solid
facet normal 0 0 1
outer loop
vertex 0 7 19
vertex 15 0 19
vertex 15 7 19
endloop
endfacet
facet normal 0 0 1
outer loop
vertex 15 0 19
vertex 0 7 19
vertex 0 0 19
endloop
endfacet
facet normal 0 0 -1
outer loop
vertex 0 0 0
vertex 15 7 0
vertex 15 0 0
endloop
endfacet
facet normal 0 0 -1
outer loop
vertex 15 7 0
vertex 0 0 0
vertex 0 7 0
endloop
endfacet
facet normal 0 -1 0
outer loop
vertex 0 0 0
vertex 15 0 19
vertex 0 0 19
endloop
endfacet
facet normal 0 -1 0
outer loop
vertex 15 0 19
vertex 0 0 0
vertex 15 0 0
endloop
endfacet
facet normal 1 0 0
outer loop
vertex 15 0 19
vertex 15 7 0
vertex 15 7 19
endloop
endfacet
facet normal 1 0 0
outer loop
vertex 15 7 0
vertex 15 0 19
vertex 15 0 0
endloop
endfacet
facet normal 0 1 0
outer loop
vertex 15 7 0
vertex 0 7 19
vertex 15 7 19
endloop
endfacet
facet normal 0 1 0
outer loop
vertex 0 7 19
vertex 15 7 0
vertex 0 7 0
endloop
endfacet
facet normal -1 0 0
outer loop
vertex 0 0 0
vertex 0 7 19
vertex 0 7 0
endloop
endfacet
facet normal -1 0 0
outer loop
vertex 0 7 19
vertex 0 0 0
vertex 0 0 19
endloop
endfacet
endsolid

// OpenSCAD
// Generated by SolidPython 1.0.1 on 2020-07-29 00:46:55


cube(size = [15, 7, 19]);
/***********************************************
*********      SolidPython code:      **********
************************************************
 
# import packages: SolidPython
from solid import *
from solid.utils import *
from itertools import chain, combinations, permutations


class Resize:

    def __init__(self, scad_file):
        self.scad_file = scad_file
        #self.scad_file = import_scad(scad_file)
        # cone/cylinder param:
        self.r1 = 0
        self.r2 = 0
        self.h = 0
        # rectangular prism param:
        self.w = 0
        self.l = 0
        # ellipse param:
        self.r = 0

    # import OpenScad code (file name corresponds to shape)


    # classify shape + parameters
    def assign(self, param1, param2, param3):
        if self.scad_file == 'cone.scad':
            self.r1 = param1
            self.r2 = param2
            self.h = param3
        elif self.scad_file == 'cylinder.scad':
            self.r1 = param1
            self.r2 = param2
            self.h = param3
        elif self.scad_file == 'rectangularPrism.scad':
            self.h = param1
            self.l = param2
            self.w = param3
        else:
            self.r = param1
            self.h = param2

    # resize parameters
    def iterate(self):
        x = range(3, 20, 2)
        i = 1
        if self.scad_file == 'cone.scad':
            tempList = list(permutations(x, 2))
            for temp in tempList:
                param1 = temp[0]
                param2 = temp[1]
                filepath = 'produced_scad_files/' + 'cone' + str(param1) + '_' + str(param2) + '_' + '.scad'
                scad_render_to_file(cylinder(h=param1, r1=param2, r2=0), filepath)

        elif self.scad_file == 'cylinder.scad':
            tempList = list(permutations(x, 3))
            for temp in tempList:
                param1 = temp[0]
                param2 = temp[1]
                filepath = 'produced_scad_files/' + 'cylinder' + str(param1) + '_' + str(param2) + '_' + '.scad'
                scad_render_to_file(cylinder(h=param1, r1=param2, r2=param2), filepath)

        elif self.scad_file == 'rectangularPrism.scad':
            tempList = list(permutations(x, 3))
            for temp in tempList:
                param1 = temp[0]
                param2 = temp[1]
                param3 = temp[2]
                filepath = 'produced_scad_files/' + 'rectangularPrism' + str(param1) + '_' + str(param2) + '_' + str(
                    param3) + '.scad'
                scad_render_to_file(cube(size=(param1, param2, param3)), filepath)

        elif self.scad_file == 'ellipse.scad':
            tempList = list(permutations(x, 4))
            for temp in tempList:
                param1 = temp[0]
                param2 = temp[1]
                param3 = temp[2]
                param4 = temp[3]
                filepath = 'produced_scad_files/' + 'ellipse' + str(param1) + '_' + str(param2) + '_' + str(param3) + '_' + str(param4) + '.scad'
                scad_render_to_file(scale([param1, param2, param3])(sphere(r=param4)), filepath)

    def render_to_scadfile(self):
        scad_render_to_file(scad, 'example.scad') 
 
************************************************/
